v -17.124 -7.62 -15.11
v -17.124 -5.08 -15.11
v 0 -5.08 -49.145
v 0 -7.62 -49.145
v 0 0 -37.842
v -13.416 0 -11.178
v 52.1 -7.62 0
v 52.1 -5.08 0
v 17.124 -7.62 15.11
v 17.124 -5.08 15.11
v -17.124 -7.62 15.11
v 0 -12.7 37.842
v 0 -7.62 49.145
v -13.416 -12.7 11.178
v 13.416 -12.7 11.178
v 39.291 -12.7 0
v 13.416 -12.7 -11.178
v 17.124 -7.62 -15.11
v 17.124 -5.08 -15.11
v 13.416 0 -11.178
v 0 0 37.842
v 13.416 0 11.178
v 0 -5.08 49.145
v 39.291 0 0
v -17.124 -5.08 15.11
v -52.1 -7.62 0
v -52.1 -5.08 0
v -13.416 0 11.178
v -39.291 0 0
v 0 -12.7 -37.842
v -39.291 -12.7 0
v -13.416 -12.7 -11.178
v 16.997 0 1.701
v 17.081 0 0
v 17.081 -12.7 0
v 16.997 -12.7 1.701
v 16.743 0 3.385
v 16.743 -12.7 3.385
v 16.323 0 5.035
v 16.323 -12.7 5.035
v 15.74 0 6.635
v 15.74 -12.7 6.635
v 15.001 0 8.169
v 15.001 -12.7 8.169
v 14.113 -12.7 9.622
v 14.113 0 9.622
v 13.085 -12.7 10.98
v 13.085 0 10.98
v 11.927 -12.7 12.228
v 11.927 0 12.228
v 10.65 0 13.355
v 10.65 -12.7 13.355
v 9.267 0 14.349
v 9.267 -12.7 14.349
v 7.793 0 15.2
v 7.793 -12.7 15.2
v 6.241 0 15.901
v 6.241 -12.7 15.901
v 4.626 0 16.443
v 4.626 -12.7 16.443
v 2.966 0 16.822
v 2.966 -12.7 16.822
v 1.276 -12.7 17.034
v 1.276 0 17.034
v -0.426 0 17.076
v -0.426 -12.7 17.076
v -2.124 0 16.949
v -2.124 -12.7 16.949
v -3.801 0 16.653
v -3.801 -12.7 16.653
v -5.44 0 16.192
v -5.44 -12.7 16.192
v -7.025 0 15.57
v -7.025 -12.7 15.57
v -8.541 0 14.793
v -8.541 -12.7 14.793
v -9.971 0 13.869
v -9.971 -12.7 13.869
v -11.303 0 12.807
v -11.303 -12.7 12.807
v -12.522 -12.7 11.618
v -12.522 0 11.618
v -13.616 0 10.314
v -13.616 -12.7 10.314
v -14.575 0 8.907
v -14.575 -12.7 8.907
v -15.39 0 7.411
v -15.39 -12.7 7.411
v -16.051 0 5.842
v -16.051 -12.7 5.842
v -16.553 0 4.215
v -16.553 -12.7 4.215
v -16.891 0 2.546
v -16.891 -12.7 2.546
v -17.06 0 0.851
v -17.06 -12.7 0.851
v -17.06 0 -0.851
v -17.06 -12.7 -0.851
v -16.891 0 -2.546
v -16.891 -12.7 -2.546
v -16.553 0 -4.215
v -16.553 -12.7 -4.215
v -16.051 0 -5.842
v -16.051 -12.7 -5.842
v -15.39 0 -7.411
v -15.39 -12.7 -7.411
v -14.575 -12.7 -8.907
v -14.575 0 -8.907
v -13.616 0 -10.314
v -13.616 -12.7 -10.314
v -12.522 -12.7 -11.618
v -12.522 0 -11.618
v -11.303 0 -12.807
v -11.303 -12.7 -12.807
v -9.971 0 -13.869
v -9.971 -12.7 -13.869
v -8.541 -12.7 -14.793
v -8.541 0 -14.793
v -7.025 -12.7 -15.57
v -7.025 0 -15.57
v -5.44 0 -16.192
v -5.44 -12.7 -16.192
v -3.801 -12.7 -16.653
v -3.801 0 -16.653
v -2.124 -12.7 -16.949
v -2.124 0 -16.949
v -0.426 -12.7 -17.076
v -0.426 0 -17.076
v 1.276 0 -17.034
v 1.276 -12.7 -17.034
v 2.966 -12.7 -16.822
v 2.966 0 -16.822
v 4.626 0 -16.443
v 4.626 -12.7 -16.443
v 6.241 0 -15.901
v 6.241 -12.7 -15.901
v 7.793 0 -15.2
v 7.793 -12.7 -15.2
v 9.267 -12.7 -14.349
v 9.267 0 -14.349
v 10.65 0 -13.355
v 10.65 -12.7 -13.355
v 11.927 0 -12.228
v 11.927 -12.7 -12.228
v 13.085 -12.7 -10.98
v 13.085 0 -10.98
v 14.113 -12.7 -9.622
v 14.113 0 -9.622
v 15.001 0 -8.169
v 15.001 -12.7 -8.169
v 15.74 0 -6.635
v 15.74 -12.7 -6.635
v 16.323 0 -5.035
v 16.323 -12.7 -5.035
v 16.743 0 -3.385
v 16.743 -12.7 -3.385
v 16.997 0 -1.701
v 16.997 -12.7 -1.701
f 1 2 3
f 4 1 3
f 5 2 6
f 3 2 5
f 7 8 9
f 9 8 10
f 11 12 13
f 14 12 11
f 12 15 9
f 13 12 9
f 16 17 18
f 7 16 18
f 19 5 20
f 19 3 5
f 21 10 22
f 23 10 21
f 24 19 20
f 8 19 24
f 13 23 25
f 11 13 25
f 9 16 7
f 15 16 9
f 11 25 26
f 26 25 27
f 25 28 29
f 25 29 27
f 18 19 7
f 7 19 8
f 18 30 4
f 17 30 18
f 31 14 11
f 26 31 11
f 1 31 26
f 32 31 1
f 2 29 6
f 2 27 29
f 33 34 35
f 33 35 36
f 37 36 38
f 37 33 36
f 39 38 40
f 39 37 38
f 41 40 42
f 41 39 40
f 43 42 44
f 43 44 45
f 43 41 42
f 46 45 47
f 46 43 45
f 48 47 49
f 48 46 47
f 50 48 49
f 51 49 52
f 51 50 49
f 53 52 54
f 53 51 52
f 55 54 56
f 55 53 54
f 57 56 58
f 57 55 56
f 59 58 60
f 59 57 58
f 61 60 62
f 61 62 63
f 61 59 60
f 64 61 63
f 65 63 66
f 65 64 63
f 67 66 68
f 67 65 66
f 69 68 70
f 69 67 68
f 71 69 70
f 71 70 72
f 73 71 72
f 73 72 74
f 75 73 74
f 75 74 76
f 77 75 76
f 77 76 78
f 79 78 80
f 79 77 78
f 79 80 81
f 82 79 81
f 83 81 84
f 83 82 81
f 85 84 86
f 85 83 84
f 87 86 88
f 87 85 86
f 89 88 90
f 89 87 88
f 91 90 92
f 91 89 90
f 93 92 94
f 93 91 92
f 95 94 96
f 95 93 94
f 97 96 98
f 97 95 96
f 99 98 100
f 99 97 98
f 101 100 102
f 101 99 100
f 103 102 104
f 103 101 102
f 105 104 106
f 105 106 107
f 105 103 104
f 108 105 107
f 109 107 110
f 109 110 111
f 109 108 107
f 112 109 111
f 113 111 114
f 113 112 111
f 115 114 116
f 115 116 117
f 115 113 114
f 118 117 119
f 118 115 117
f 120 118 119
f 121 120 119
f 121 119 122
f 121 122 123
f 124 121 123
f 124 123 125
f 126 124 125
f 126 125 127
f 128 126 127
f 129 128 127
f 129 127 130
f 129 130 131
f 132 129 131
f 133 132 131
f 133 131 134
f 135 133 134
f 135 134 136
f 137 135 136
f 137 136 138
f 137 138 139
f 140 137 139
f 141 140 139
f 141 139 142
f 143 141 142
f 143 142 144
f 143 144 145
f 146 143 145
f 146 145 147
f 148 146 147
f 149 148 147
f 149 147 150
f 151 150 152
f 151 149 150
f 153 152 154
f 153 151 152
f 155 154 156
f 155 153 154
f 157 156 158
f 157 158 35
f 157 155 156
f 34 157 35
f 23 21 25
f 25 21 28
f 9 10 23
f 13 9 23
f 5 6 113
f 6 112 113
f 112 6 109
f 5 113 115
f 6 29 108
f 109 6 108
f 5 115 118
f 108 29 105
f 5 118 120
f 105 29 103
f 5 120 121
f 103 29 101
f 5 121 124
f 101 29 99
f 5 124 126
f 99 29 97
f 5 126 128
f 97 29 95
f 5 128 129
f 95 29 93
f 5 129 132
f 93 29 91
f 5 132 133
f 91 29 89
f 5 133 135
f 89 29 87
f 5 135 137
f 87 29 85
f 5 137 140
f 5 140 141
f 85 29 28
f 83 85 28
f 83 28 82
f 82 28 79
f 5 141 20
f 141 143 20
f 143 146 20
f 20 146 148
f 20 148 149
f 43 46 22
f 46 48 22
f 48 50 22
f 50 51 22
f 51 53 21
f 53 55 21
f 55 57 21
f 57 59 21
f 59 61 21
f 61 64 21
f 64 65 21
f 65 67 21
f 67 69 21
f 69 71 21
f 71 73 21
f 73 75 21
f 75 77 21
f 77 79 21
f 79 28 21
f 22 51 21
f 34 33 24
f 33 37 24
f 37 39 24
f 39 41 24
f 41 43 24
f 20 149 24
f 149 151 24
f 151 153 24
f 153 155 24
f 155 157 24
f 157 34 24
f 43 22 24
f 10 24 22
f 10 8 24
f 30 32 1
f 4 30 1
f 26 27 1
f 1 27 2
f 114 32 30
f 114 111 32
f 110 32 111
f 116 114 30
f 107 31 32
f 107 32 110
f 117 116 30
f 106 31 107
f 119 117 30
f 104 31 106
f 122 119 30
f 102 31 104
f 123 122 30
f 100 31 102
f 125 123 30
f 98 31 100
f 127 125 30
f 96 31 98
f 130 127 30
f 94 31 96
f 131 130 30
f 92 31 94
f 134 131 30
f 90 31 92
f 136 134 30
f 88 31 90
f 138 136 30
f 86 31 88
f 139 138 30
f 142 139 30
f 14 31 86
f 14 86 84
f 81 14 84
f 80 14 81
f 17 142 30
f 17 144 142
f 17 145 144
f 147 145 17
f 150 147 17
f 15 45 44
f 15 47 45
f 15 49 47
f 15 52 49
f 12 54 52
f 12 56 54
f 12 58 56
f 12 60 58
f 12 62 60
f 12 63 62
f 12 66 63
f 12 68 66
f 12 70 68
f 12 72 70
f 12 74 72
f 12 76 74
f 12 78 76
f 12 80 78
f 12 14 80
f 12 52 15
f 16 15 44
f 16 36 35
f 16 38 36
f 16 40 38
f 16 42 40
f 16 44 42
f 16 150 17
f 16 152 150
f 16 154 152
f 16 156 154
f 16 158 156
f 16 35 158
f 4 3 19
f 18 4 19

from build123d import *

# Parameters (mm, degrees)
F0_R     = 17.081459
F1_DEPTH = 12.7
F2_SIZE  = 5.08
F3_SIZE  = 5.08


with BuildPart() as f1:
    # F0 (on Front) → F1 (new body)
    with BuildSketch(Plane.XZ):
        Polygon((-17.124444, 15.109803), (-52.100205, 0), (-17.124444, -15.109803), (0, -49.144541), (17.124444, -15.109803), (52.100205, 0), (17.124444, 15.109803), (0, 49.144541), align=None)
        Circle(F0_R, mode=Mode.SUBTRACT)
    extrude(amount=F1_DEPTH)

    # F2
    f2_edges = [f1.edges().sort_by_distance(p)[0] for p in [
        (-34.612325, -12.7, -7.554901),
        (-34.612325, -12.7, 7.554901),
        (-8.562222, -12.7, 32.127172),
        (8.562222, -12.7, 32.127172),
        (34.612325, -12.7, 7.554901),
        (34.612325, -12.7, -7.554901),
        (8.562222, -12.7, -32.127172),
        (-8.562222, -12.7, -32.127172),
    ]]
    chamfer(f2_edges, length=F2_SIZE)

    # F3
    f3_edges = [f1.edges().sort_by_distance(p)[0] for p in [
        (8.562222, 0, 32.127172),
        (-8.562222, 0, 32.127172),
        (-34.612325, 0, 7.554901),
        (-34.612325, 0, -7.554901),
        (-8.562222, 0, -32.127172),
        (8.562222, 0, -32.127172),
        (34.612325, 0, -7.554901),
        (34.612325, 0, 7.554901),
    ]]
    chamfer(f3_edges, length=F3_SIZE)


solid = f1.part
